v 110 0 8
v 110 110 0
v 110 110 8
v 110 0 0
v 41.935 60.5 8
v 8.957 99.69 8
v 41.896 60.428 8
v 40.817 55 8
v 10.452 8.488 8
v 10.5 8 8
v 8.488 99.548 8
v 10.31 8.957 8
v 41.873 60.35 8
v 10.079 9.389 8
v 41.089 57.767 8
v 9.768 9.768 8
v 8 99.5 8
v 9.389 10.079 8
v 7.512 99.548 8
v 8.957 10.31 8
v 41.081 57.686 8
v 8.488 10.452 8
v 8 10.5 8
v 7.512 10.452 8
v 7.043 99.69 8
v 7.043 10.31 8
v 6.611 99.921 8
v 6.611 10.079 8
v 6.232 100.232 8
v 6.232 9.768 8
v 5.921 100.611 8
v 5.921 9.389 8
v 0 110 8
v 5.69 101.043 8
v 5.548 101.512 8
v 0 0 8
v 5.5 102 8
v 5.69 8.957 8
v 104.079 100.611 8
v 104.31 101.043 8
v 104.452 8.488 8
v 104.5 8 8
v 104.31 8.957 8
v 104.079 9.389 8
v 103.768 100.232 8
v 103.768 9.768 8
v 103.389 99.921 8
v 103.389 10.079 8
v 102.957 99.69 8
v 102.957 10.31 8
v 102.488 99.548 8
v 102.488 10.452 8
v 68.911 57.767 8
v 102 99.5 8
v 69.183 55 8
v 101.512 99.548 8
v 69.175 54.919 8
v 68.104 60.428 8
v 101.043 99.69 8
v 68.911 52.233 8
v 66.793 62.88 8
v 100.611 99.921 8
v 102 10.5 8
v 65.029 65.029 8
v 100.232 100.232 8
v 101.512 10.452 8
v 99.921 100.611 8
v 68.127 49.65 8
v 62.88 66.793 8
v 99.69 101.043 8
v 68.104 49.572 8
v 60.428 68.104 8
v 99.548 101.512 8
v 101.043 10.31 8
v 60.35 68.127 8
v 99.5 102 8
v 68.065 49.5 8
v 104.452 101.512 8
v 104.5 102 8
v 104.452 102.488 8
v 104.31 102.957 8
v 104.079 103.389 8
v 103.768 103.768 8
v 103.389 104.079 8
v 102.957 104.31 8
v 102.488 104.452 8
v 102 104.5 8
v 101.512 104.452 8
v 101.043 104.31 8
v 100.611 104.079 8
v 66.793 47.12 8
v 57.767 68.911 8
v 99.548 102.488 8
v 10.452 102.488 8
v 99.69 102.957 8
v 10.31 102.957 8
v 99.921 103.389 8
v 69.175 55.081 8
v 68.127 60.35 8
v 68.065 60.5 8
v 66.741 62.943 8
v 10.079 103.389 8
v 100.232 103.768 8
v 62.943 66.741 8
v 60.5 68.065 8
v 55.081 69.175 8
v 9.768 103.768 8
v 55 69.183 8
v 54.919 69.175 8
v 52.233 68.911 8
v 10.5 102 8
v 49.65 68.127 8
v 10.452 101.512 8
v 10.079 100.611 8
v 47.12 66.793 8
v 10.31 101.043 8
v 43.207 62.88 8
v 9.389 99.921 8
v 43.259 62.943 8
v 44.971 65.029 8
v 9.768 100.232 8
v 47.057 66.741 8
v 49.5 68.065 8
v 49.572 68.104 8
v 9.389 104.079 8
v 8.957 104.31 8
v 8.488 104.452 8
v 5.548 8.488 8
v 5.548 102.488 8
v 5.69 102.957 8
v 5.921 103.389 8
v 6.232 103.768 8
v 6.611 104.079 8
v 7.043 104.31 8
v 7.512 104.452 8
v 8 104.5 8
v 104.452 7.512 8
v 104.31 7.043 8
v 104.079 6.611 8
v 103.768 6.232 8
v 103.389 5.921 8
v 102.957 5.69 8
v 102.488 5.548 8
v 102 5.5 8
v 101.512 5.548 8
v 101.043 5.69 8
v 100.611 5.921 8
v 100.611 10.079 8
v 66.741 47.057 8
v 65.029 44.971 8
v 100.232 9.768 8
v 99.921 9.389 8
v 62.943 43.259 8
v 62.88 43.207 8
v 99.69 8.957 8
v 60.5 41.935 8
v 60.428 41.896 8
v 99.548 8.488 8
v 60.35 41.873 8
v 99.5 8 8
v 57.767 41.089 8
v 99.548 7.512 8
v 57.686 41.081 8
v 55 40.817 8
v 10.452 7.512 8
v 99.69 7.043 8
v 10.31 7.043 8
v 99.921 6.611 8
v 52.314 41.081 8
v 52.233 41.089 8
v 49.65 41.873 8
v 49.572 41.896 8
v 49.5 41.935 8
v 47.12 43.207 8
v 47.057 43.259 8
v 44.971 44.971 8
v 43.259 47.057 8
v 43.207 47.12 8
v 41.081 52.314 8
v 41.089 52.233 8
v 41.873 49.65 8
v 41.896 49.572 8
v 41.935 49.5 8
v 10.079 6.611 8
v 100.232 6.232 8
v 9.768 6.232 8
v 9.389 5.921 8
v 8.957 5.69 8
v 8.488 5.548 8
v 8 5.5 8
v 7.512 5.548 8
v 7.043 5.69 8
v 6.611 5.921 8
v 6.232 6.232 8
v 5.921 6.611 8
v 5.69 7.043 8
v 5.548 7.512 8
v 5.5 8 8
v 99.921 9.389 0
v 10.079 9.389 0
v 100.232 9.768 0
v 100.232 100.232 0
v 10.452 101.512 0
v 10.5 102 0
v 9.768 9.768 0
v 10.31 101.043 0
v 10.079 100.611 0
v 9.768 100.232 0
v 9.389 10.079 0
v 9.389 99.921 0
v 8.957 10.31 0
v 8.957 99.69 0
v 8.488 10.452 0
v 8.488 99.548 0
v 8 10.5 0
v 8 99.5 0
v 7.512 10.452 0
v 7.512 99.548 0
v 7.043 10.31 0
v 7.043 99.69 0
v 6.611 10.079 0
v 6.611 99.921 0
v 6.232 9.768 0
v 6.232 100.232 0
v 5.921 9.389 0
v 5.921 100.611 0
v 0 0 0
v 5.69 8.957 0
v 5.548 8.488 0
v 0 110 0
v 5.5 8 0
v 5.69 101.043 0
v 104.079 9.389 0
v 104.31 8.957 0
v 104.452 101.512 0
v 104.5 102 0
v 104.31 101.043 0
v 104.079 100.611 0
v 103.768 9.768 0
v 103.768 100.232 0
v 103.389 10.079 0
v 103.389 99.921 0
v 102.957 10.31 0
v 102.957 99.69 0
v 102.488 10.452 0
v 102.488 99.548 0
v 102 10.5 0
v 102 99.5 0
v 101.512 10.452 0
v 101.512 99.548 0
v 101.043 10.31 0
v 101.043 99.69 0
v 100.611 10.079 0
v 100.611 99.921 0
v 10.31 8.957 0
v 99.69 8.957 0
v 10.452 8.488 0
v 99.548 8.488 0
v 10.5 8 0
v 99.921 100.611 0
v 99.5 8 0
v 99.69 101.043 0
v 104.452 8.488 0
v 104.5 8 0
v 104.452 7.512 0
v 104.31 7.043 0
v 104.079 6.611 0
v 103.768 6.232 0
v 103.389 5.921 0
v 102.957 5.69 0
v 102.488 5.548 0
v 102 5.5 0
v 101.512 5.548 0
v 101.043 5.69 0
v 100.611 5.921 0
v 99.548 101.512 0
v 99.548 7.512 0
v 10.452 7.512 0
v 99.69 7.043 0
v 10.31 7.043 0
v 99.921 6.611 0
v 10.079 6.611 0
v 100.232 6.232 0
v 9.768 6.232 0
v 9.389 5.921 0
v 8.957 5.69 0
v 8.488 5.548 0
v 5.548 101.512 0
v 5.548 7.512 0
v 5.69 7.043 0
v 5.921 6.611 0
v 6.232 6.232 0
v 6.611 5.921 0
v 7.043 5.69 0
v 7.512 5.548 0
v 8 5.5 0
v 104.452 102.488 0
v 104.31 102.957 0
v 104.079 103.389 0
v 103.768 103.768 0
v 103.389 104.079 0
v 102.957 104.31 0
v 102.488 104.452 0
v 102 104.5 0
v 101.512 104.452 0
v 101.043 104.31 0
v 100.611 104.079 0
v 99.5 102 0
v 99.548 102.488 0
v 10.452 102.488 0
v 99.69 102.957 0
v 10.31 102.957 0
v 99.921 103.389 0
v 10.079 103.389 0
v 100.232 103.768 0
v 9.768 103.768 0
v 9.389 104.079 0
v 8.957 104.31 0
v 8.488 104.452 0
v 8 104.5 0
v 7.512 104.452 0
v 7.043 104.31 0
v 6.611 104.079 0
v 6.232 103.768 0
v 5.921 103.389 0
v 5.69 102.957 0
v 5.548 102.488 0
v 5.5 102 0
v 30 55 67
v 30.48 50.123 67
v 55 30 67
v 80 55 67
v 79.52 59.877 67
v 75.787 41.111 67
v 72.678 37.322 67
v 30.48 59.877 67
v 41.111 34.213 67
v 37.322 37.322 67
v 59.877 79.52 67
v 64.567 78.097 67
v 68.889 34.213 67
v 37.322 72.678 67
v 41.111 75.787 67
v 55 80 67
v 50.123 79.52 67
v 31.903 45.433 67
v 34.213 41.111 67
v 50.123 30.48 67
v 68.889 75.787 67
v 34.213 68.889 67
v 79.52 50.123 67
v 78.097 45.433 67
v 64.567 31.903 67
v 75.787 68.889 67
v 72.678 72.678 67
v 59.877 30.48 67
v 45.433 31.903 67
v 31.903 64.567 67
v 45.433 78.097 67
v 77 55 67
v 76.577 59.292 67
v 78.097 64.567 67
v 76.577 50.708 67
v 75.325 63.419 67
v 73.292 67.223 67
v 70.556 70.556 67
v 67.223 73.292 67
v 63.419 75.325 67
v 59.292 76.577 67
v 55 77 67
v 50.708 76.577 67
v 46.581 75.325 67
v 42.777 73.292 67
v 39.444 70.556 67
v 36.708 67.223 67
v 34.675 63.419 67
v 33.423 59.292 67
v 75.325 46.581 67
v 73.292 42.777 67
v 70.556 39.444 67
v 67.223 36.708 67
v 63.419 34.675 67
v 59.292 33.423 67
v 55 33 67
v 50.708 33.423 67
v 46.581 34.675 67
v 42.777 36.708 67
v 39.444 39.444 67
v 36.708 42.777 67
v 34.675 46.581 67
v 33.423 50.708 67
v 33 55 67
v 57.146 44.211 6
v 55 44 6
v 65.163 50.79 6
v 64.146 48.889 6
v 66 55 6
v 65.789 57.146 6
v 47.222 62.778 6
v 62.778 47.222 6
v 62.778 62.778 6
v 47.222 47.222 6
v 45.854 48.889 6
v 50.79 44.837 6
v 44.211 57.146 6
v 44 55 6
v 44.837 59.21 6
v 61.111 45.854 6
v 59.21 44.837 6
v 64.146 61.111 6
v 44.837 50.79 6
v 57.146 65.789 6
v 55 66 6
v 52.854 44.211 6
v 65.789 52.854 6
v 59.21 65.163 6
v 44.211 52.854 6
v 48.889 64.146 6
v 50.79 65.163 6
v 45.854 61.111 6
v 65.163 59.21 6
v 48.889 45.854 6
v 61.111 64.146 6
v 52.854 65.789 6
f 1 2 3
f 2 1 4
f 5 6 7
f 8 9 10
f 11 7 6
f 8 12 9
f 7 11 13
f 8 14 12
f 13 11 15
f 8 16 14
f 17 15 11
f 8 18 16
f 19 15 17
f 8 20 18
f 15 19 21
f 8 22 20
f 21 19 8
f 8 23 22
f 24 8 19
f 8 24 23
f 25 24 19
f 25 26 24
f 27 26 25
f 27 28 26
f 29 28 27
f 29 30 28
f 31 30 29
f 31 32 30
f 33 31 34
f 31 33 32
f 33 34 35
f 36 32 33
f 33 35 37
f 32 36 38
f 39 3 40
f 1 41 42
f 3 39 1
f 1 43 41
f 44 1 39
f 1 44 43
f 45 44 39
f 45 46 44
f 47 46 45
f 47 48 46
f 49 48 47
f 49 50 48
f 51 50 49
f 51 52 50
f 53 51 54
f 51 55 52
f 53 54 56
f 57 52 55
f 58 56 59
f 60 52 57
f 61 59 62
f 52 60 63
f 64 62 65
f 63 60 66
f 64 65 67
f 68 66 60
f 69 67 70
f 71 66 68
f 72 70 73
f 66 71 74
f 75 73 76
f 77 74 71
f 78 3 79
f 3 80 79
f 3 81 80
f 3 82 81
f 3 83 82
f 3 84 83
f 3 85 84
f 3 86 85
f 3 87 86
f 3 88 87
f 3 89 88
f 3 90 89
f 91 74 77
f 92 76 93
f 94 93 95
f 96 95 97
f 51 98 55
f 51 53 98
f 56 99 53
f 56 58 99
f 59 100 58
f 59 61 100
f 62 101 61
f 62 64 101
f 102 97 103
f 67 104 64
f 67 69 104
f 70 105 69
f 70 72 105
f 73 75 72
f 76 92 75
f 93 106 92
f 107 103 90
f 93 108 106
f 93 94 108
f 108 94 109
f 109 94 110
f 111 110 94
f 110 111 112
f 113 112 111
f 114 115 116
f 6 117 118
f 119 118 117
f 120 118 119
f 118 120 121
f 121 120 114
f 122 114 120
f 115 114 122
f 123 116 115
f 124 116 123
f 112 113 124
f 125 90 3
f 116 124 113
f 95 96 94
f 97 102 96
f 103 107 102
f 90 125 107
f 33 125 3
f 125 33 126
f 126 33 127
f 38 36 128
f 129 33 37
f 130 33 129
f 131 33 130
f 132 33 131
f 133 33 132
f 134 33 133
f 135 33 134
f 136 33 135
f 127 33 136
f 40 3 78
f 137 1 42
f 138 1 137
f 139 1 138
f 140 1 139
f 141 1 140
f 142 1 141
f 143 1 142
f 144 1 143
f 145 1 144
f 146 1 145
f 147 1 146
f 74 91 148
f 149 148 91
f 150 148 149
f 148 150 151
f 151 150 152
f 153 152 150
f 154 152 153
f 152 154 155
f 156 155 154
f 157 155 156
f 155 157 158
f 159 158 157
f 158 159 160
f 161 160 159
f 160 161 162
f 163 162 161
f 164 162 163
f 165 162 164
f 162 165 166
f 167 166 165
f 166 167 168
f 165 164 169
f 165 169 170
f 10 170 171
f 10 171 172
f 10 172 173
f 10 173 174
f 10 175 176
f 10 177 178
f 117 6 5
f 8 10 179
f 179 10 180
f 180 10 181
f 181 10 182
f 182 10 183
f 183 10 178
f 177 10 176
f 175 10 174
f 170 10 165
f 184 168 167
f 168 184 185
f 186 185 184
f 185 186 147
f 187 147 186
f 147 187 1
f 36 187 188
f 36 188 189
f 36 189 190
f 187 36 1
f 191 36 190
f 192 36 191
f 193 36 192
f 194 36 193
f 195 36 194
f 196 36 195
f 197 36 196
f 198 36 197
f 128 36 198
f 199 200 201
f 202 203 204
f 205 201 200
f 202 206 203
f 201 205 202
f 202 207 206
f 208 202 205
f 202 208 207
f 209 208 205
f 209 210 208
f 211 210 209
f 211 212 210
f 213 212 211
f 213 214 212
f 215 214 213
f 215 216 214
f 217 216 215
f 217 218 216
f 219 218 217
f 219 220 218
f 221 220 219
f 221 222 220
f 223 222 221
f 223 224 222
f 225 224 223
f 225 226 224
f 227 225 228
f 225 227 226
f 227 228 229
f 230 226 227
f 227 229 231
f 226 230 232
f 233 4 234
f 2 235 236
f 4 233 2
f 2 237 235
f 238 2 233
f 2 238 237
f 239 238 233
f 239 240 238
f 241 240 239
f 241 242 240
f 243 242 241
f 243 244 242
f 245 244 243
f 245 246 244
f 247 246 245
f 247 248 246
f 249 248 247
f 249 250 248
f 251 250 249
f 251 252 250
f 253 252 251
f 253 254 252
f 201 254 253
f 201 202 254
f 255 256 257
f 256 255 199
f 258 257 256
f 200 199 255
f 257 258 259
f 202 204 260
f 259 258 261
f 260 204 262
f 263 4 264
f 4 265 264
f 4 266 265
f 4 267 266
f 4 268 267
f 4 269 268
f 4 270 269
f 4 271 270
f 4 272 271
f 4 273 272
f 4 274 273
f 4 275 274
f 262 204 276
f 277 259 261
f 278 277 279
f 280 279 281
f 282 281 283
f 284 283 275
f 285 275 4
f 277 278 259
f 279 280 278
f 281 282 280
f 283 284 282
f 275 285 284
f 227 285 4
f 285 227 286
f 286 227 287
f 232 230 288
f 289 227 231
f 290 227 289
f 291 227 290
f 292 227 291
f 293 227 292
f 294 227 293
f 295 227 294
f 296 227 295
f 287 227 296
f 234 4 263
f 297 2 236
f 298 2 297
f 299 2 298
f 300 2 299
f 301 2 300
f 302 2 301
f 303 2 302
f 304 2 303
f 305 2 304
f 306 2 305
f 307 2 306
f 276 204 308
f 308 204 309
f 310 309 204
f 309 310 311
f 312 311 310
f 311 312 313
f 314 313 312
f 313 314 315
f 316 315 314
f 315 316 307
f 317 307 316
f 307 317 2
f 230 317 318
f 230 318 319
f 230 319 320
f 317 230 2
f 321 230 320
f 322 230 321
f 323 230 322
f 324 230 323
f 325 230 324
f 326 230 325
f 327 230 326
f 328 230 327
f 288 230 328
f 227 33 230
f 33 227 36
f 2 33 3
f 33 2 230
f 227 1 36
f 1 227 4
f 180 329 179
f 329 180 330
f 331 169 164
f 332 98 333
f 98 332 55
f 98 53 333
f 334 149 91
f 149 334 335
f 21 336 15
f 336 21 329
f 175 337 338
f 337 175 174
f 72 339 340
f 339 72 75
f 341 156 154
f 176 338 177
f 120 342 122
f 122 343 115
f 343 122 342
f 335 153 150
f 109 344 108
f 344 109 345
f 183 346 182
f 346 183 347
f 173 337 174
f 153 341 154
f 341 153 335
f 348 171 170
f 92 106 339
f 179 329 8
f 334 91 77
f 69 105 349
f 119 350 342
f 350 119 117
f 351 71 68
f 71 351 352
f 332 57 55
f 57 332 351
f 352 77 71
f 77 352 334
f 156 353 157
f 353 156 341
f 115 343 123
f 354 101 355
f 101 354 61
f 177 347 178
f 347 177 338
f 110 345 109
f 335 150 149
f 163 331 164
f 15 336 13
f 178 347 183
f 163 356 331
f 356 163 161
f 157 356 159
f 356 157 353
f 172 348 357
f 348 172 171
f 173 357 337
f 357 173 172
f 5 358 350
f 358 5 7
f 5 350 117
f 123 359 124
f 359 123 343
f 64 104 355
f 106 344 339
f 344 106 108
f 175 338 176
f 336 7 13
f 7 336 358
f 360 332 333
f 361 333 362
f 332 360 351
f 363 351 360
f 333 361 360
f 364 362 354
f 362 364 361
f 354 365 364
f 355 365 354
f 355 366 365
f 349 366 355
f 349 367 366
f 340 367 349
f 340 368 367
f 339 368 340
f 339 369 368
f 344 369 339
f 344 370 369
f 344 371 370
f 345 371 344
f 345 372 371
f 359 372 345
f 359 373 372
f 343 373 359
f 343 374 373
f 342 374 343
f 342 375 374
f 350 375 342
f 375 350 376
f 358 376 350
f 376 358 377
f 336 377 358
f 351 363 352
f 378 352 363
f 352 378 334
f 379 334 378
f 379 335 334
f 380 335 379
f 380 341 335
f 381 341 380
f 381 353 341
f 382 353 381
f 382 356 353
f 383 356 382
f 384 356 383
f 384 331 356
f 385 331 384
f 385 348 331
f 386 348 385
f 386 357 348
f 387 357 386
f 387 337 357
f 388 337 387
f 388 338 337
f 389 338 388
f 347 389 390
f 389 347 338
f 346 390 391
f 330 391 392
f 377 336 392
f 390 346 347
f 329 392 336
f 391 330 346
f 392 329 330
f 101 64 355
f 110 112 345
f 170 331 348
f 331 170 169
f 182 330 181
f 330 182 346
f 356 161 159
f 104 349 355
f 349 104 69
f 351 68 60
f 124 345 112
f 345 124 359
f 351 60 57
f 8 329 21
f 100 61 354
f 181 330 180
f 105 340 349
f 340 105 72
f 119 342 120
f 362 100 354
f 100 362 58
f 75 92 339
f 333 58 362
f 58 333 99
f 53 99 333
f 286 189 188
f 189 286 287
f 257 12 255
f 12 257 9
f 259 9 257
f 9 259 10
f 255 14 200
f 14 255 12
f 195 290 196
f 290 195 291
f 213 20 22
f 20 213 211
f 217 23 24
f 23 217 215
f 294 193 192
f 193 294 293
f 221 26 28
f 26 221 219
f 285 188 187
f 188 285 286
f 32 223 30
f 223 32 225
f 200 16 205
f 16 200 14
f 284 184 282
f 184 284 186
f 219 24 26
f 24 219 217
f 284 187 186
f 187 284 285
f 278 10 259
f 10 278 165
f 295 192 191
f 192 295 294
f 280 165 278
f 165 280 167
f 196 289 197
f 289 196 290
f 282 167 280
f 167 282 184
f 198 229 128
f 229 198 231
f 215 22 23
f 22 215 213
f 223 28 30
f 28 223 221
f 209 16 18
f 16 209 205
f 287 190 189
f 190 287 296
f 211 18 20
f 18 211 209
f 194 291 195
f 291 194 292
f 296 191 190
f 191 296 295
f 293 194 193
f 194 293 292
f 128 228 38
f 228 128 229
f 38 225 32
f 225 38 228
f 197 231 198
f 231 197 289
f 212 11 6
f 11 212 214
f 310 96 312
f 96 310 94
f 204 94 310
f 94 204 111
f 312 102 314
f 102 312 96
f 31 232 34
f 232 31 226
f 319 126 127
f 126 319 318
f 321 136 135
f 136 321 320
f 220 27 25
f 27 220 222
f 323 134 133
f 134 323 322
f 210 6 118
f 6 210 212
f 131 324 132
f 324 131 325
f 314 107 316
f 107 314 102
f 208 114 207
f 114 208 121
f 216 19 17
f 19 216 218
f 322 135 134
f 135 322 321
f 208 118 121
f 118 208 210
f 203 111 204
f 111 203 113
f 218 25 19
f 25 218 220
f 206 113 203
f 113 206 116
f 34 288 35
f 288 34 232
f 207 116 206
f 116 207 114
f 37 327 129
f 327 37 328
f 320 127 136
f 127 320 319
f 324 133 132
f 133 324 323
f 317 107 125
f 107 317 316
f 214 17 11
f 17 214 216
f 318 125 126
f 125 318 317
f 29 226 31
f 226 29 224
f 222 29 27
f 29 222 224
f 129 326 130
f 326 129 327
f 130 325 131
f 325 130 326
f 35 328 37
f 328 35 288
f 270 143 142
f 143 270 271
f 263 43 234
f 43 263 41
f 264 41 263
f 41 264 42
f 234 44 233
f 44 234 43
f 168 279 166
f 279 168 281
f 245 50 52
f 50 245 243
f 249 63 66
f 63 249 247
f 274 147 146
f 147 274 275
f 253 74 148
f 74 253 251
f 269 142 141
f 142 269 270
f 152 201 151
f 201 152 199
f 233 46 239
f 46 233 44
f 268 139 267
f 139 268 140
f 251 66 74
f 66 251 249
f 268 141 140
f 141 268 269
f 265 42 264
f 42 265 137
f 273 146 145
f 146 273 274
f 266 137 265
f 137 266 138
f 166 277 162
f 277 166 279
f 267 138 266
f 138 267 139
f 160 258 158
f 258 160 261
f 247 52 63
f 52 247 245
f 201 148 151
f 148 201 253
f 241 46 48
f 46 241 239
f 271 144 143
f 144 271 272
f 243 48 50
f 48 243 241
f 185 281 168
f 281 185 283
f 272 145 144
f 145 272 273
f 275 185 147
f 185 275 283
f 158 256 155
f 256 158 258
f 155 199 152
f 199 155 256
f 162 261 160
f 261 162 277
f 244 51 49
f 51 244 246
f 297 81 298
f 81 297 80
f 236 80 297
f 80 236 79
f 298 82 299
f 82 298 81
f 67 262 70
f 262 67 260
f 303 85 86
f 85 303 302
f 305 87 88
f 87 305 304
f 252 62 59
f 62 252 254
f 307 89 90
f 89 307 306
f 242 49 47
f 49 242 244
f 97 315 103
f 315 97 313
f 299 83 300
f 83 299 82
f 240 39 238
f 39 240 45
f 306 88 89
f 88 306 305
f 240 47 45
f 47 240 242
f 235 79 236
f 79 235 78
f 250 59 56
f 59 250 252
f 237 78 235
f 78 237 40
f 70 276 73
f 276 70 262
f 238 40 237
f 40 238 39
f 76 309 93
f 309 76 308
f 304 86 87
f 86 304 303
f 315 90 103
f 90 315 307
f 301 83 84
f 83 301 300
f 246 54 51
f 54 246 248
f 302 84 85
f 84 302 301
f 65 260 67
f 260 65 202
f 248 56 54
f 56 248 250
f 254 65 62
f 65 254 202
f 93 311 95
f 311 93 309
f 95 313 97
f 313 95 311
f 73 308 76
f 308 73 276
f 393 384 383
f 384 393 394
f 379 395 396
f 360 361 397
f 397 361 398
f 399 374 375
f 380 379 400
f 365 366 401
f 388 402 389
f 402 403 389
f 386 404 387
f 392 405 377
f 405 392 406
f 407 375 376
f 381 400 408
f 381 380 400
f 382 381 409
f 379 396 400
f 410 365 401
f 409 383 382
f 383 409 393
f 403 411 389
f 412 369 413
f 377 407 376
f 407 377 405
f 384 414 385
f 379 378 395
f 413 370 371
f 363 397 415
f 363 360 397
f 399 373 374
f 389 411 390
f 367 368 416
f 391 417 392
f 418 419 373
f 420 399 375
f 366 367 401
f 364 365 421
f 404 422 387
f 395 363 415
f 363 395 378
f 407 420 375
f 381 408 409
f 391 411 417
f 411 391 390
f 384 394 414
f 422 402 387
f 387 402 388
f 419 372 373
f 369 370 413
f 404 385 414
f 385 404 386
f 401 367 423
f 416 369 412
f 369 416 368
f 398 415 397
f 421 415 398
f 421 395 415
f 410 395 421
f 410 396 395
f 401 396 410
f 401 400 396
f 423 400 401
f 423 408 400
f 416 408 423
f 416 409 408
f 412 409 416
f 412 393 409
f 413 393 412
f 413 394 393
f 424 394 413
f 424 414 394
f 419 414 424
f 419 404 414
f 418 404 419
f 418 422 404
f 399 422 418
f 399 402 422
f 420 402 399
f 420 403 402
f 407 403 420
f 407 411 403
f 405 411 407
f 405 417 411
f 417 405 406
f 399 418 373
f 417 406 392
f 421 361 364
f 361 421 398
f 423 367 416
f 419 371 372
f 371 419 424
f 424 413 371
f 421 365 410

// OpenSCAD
$fn = 32;

// ----------------------------------------------------------------------
// Hopper: flanged with square flange
// ----------------------------------------------------------------------

// --- parameters (mm) ---
fl = 110;                 // flange side, X and Y
fl_t = 8;                 // flange thickness
cone_h = 60;              // cone height above the flange
top_d = 50;               // cone mouth diameter
bot_d = 28;               // cone spout diameter
wall = 3;                 // cone wall thickness
hole_r = 2.5;             // flange hole radius
hole_in = 8;              // hole inset from the corners

bore_d = bot_d - 2 * wall;  // spout bore diameter
total_h = fl_t + cone_h - 1;  // overall height

difference() {
  union() {
    cube([fl, fl, fl_t]);
    translate([fl / 2, fl / 2, fl_t - 1])
      cylinder(h = cone_h, d1 = bot_d, d2 = top_d);
  }
  translate([fl / 2, fl / 2, fl_t - 2])
    cylinder(h = cone_h + 1, d1 = bore_d, d2 = top_d - 2 * wall);
  for (sx = [0, 1], sy = [0, 1])
    translate([sx ? fl - hole_in : hole_in,
               sy ? fl - hole_in : hole_in, -1])
      cylinder(r = hole_r, h = fl_t + 2);
}
